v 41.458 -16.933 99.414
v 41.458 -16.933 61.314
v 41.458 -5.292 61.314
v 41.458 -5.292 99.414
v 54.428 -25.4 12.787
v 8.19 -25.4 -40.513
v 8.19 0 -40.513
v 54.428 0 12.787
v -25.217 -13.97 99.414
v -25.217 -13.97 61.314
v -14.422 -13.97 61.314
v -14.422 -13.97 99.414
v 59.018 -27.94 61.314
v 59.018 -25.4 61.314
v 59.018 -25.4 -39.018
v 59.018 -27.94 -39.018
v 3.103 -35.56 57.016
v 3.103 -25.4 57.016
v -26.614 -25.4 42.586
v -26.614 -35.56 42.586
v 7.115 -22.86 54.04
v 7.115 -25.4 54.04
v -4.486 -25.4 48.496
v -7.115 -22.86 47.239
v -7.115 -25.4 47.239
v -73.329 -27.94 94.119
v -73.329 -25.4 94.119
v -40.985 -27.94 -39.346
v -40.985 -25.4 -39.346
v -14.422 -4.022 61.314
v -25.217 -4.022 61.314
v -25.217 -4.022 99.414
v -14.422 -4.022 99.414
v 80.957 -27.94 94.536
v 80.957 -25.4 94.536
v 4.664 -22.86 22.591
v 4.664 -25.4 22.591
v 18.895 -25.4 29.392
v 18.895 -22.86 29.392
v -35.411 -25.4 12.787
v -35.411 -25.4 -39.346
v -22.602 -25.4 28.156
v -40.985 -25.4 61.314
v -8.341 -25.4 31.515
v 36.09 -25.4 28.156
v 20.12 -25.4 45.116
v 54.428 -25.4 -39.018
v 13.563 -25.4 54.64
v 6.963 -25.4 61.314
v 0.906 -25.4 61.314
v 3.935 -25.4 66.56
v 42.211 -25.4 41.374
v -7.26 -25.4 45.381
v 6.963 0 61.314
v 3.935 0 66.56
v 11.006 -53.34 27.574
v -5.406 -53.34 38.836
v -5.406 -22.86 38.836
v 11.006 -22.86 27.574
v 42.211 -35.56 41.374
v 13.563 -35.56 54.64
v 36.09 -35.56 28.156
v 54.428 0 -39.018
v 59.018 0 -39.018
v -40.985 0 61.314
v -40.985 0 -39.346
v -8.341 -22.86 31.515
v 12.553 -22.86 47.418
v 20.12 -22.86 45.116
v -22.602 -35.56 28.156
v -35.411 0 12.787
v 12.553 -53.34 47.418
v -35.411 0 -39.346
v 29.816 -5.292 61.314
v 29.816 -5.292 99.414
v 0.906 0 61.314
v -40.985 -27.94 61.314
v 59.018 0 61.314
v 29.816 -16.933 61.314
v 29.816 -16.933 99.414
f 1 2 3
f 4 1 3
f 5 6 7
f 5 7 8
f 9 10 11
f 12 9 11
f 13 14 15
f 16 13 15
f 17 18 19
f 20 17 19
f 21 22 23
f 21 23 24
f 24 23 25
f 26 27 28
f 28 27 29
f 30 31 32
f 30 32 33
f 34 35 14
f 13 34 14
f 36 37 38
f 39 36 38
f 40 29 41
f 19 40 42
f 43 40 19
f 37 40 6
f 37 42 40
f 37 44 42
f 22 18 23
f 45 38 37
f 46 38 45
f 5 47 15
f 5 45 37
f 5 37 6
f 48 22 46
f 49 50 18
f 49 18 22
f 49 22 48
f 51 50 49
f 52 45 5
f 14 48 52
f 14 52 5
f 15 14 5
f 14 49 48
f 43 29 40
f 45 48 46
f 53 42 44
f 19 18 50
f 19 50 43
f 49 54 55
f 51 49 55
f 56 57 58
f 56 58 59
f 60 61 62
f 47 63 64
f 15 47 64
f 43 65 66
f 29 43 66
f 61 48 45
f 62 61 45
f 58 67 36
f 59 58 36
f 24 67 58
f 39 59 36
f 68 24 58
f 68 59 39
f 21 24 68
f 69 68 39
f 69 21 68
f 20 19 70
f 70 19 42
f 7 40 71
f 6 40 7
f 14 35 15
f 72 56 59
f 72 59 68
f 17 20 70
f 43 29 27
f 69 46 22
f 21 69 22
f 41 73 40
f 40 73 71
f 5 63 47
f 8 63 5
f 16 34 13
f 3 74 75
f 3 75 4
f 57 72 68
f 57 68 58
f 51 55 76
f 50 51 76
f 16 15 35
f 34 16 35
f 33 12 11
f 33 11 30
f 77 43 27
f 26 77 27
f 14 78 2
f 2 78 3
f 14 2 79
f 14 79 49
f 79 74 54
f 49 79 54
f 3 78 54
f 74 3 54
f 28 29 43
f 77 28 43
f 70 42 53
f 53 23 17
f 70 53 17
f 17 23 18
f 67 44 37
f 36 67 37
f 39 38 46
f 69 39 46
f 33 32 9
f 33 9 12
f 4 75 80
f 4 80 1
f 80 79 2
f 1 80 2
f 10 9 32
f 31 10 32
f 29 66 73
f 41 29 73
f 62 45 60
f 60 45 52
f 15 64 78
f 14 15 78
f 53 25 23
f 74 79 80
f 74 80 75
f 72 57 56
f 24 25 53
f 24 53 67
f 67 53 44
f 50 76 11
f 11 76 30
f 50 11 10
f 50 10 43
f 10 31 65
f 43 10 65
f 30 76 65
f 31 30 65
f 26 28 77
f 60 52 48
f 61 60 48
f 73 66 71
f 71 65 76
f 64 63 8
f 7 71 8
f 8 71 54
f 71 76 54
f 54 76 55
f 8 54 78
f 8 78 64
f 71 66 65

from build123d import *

# Parameters (mm, degrees)
F0_W      = 5.5739544332
F0_H      = 52.1328803152
F0_W_2    = 4.5903213322
F0_H_2    = 51.8049988896
F1_DEPTH  = 25.4
F3_DEPTH  = 2.54
F5_DEPTH  = 2.54
F7_DEPTH  = 30.48
F8_W      = 11.6416700184
F8_H      = 11.6416662931
F8_W_2    = 10.7949981466
F8_H_2    = 9.9483337253
F9_DEPTH  = 38.1
F11_DEPTH = 10.16
F13_DEPTH = 5.08
F15_DEPTH = 25.4


with BuildPart() as f1:
    # F0 (on Front) → F1 (new body)
    with BuildSketch(Plane.XZ):
        Polygon((-40.9849695861, 61.3135099411), (-40.9849695861, 12.7873104066), (-35.4110151529, 12.7873104066), (-7.8691178933, 12.7873104066), (22.2958195955, 12.7873104066), (54.4280335307, 12.7873104066), (59.0183548629, 12.7873104066), (59.0183548629, 61.3135099411), (6.9633811861, 61.3135099411), (24.947018414, 30.1649365574), (-17.0779079713, 30.1649365574), (0.9057292566, 61.3135099411), align=None)
        with Locations((-38.1979923695, -13.279129751)):
            Rectangle(F0_W, F0_H)
        with BuildLine():
            Line((22.2958195955, 12.7873104066), (-7.8691178933, 12.7873104066))
            ThreePointArc((-7.8691178933, 12.7873104066), (-4.8255429787, 9.4580783197), (-2.0328208254, 5.9157856266))
            ThreePointArc((-2.0328208254, 5.9157856266), (5.2186895972, -7.0208173818), (9.1806305572, -21.3121827692))
            ThreePointArc((9.1806305572, -21.3121827692), (19.1156867099, -5.5614598226), (22.2958195955, 12.7873104066))
        make_face()
        with BuildLine():
            ThreePointArc((-2.0328208254, 5.9157856266), (-4.8255429787, 9.4580783197), (-7.8691178933, 12.7873104066))
            ThreePointArc((-7.8691178933, 12.7873104066), (-18.7687746779, -1.7887329993), (-8.3092054777, -16.6837312046))
            ThreePointArc((-8.3092054777, -16.6837312046), (-7.7508381444, -4.6674984453), (-2.0328208254, 5.9157856266))
        make_face()
        Polygon((3.9345552213, 66.5595903993), (0.9057292566, 61.3135099411), (6.9633811861, 61.3135099411), align=None)
        Polygon((6.9633811861, 61.3135099411), (0.9057292566, 61.3135099411), (-17.0779079713, 30.1649365574), (24.947018414, 30.1649365574), align=None)
        with Locations((56.7231941968, -13.1151890382)):
            Rectangle(F0_W_2, F0_H_2)
    extrude(amount=F1_DEPTH)

    # F2 (on face) → F3 (cut)
    with BuildSketch(Plane.XZ.offset(25.4)):
        Polygon((7.1152635136, 54.0399153627), (-7.1152635136, 47.2390080892), (-8.3407685595, 31.5145565376), (4.6642534218, 22.5910122596), (18.8947804489, 29.3919195331), (20.1202854949, 45.1163710847), align=None)
    extrude(amount=-F3_DEPTH, mode=Mode.SUBTRACT)

    # F6 (on face) → F7 (join)
    with BuildSketch(Plane.XZ.offset(22.86)):
        Polygon((11.0062066034, 27.5737748613), (12.5528272673, 47.4184599407), (-5.4064844735, 38.835530186), align=None)
    extrude(amount=F7_DEPTH)

    # F8 (on face) → F9 (join)
    with BuildSketch(Plane.XY.offset(61.3135099411)):
        with Locations((35.6366988271, -11.1124999821)):
            Rectangle(F8_W, F8_H)
        with Locations((-19.8199688457, -8.9958328754)):
            Rectangle(F8_W_2, F8_H_2)
    extrude(amount=F9_DEPTH)

    # F10 (on face) → F11 (join)
    with BuildSketch(Plane.XZ.offset(25.4)):
        Polygon((-26.6139451414, 42.5856905058), (-22.6019006222, 28.1555410475), (3.1028238591, 57.0158399642), align=None)
        Polygon((42.2106273472, 41.3744188845), (13.5632408783, 54.6397082508), (36.0895719485, 28.1555410475), align=None)
    extrude(amount=F11_DEPTH)

    # F12 (on face) → F13 (cut)
    with BuildSketch(Plane.XZ.offset(25.4)):
        Polygon((42.4381633341, 52.4575896561), (42.7437583864, 52.4575896561), (43.0469437303, 52.4958908722), (43.342937952, 52.5718892712), (43.6270730458, 52.6843863131), (43.8948680314, 52.8316078523), (44.142099622, 53.0112321172), (44.3648688278, 53.2204263258), (44.5596624452, 53.4558913604), (44.7234084626, 53.7139137969), (44.8535245074, 53.9904244672), (44.947958572, 54.281062633), (45.0052213746, 54.5812447567), (45.0244098467, 54.8862367868), (45.0052213746, 55.191228817), (44.947958572, 55.4914109407), (44.8535245074, 55.7820491065), (44.7234084626, 56.0585597768), (44.5596624452, 56.3165822133), (44.3648688278, 56.5520472479), (44.142099622, 56.7612414565), (43.8948680314, 56.9408657214), (43.6270730458, 57.0880872606), (43.342937952, 57.2005843025), (43.0469437303, 57.2765827015), (42.7437583864, 57.3148839176), (42.4381633341, 57.3148839176), (42.1349779902, 57.2765827015), (41.8389837685, 57.2005843025), (41.5548486747, 57.0880872606), (41.2870536891, 56.9408657214), (41.0398220985, 56.7612414565), (40.8170528927, 56.5520472479), (40.6222592753, 56.3165822133), (40.4585132579, 56.0585597768), (40.3283972131, 55.7820491065), (40.2339631485, 55.4914109407), (40.1767003459, 55.191228817), (40.1575118738, 54.8862367868), (40.1767003459, 54.5812447567), (40.2339631485, 54.281062633), (40.3283972131, 53.9904244672), (40.4585132579, 53.7139137969), (40.6222592753, 53.4558913604), (40.8170528927, 53.2204263258), (41.0398220985, 53.0112321172), (41.2870536891, 52.8316078523), (41.5548486747, 52.6843863131), (41.8389837685, 52.5718892712), (42.1349779902, 52.4958908722), align=None)
        Polygon((-27.9694433308, 53.8256032829), (-27.8940302335, 54.0436492796), (-27.8465402009, 54.2694276859), (-27.827722179, 54.4993778413), (-27.8378729394, 54.7298732946), (-27.8768323985, 54.9572789948), (-27.9439861424, 55.1780086181), (-28.0382751163, 55.3885811265), (-28.158212327, 55.5856756659), (-28.3019062928, 55.7661839375), (-28.4670908742, 55.927259218), (-28.6511610115, 56.0663612542), (-28.8512138089, 56.1812963237), (-29.0640943141, 56.2702518319), (-29.2864452744, 56.3318248973), (-29.5147600823, 56.3650444758), (-29.745438077, 56.3693866749), (-29.9748413287, 56.3447830154), (-30.199352011, 56.2916215119), (-30.4154294563, 56.2107405528), (-30.6196659944, 56.1034156794), (-30.8088406929, 55.9713394689), (-30.9799701539, 55.8165948422), (-31.1303555635, 55.6416222143), (-31.257625254, 55.4491810082), (-31.3597721063, 55.2423061366), (-31.4351852036, 55.0242601399), (-31.4826752363, 54.7984817337), (-31.5014932582, 54.5685315782), (-31.4913424978, 54.3380361249), (-31.4523830387, 54.1106304248), (-31.3852292948, 53.8899008014), (-31.2909403208, 53.679328293), (-31.1710031102, 53.4822337537), (-31.0273091444, 53.3017254821), (-30.862124563, 53.1406502015), (-30.6780544256, 53.0015481654), (-30.4780016283, 52.8866130958), (-30.2651211231, 52.7976575876), (-30.0427701628, 52.7360845222), (-29.8144553549, 52.7028649437), (-29.5837773602, 52.6985227447), (-29.3543741085, 52.7231264041), (-29.1298634262, 52.7762879077), (-28.9137859808, 52.8571688667), (-28.7095494428, 52.9644937401), (-28.5203747443, 53.0965699506), (-28.3492452833, 53.2513145774), (-28.1988598737, 53.4262872052), (-28.0715901832, 53.6187284113), align=None)
    extrude(amount=F13_DEPTH, mode=Mode.SUBTRACT)

    # F14 (on face) → F15 (join)
    with BuildSketch(Plane.XZ.offset(25.4)):
        Polygon((54.4280335307, 12.7873104066), (-35.4110151529, 12.7873104066), (8.1901153082, -40.5132803528), align=None)
    extrude(amount=-F15_DEPTH)


with BuildPart() as f5:
    # F4 (on face) → F5 (new body)
    with BuildSketch(Plane.XZ.offset(25.4)):
        Polygon((-73.3285173774, 94.1193550825), (-40.9849695861, -39.3455699086), (-40.9849695861, 61.3135099411), align=None)
    extrude(amount=F5_DEPTH)


with BuildPart() as f5b:
    # F4 (on face) → F5, piece 2 (new body)
    with BuildSketch(Plane.XZ.offset(25.4)):
        Polygon((80.9571295977, 94.5362001657), (59.0183548629, 61.3135099411), (59.0183548629, -39.017688483), align=None)
    extrude(amount=F5_DEPTH)


solid = Compound([f1.part, f5.part, f5b.part])
